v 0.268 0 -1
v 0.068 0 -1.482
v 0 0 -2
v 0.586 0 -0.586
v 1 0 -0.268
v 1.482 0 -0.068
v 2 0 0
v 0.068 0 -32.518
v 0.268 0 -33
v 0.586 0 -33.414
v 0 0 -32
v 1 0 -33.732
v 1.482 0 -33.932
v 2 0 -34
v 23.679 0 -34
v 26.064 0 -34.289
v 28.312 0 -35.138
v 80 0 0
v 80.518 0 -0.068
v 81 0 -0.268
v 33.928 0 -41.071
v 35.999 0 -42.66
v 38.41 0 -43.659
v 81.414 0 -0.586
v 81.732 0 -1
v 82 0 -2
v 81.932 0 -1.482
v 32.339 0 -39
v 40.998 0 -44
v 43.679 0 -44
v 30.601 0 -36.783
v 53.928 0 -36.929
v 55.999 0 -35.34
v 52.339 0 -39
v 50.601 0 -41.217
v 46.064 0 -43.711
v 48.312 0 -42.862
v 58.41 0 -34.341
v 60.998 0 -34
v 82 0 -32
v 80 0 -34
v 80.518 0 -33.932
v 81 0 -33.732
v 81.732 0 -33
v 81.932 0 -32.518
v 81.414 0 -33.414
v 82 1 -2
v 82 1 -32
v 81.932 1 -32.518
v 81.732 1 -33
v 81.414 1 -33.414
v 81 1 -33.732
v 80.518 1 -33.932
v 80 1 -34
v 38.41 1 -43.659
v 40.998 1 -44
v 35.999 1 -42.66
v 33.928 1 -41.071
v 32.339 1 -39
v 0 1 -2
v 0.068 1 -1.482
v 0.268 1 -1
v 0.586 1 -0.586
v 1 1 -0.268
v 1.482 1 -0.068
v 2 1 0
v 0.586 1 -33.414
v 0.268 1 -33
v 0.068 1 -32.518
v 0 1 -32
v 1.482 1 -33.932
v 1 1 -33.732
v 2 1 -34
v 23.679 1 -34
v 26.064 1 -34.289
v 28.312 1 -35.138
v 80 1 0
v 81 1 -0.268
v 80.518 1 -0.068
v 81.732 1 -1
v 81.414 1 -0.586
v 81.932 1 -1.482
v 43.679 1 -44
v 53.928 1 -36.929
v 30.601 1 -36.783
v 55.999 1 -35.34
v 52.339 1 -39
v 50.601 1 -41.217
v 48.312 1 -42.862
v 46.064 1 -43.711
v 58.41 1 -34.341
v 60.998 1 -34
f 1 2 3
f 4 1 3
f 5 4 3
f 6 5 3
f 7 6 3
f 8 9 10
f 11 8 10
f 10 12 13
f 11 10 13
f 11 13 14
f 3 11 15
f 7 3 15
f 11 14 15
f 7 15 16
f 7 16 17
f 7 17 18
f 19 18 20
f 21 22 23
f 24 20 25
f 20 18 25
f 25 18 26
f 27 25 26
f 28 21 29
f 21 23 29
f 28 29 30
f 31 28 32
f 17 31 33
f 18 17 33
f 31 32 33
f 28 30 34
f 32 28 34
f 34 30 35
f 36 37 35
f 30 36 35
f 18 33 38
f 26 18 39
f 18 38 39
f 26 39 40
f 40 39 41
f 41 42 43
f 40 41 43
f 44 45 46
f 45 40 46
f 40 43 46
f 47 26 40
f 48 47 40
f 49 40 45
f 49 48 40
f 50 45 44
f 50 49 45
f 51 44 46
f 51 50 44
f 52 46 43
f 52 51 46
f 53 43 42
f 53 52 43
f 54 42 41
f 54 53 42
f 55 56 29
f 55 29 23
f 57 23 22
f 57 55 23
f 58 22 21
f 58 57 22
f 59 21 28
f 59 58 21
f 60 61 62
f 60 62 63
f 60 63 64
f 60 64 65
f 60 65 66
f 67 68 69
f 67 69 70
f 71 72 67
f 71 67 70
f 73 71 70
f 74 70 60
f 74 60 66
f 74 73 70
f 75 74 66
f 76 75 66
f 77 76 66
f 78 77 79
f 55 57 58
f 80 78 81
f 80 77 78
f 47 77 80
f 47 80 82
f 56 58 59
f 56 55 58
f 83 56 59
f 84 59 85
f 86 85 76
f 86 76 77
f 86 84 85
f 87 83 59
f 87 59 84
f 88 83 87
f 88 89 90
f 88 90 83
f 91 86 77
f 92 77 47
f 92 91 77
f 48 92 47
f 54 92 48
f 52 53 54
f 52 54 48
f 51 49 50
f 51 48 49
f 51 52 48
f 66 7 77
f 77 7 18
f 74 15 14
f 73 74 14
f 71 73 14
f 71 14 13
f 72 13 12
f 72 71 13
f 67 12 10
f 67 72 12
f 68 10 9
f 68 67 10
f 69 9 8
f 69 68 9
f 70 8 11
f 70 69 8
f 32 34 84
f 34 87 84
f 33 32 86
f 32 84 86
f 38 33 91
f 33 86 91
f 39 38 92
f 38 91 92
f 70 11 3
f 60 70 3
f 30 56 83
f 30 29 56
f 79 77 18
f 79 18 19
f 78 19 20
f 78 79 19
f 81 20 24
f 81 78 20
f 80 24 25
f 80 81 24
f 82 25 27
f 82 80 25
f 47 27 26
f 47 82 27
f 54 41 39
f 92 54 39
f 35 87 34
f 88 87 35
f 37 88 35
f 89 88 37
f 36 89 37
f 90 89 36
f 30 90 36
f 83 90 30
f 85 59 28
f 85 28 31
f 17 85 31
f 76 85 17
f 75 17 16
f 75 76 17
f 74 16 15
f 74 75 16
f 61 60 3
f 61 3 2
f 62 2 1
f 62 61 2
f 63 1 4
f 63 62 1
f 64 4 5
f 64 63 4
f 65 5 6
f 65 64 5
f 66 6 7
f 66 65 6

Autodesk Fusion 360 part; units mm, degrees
sketch "Sketch1" plane through (0, 0, 0) normal (0, 1, 0) x (1, 0, 0)
  line L0 (0, 0) -> (82, 0)
  line L1 (82, 0) -> (82, 34)
  line L2 (82, 34) -> (0, 34)
  line L3 (0, 34) -> (0, 0)
  line L4 (31, 44) -> (51, 44)
  line L5 (51, 44) -> (51, 34)
  line L6 (51, 34) -> (31, 34)
  line L7 (31, 34) -> (31, 44)
  dimension "d1" = 82
  dimension "d2" = 34
  dimension "d3" = 20
  dimension "d4" = 10
extrude "Extrude1" add sketch "Sketch1" along normal blind 1
fillet "Fillet1" radius 10 4 edges at (51, 0.5, -34) (51, 0.5, -44) (31, 0.5, -44) (31, 0.5, -34)
fillet "Fillet2" radius 2 4 edges at (0, 0.5, 0) (82, 0.5, 0) (82, 0.5, -34) (0, 0.5, -34)
